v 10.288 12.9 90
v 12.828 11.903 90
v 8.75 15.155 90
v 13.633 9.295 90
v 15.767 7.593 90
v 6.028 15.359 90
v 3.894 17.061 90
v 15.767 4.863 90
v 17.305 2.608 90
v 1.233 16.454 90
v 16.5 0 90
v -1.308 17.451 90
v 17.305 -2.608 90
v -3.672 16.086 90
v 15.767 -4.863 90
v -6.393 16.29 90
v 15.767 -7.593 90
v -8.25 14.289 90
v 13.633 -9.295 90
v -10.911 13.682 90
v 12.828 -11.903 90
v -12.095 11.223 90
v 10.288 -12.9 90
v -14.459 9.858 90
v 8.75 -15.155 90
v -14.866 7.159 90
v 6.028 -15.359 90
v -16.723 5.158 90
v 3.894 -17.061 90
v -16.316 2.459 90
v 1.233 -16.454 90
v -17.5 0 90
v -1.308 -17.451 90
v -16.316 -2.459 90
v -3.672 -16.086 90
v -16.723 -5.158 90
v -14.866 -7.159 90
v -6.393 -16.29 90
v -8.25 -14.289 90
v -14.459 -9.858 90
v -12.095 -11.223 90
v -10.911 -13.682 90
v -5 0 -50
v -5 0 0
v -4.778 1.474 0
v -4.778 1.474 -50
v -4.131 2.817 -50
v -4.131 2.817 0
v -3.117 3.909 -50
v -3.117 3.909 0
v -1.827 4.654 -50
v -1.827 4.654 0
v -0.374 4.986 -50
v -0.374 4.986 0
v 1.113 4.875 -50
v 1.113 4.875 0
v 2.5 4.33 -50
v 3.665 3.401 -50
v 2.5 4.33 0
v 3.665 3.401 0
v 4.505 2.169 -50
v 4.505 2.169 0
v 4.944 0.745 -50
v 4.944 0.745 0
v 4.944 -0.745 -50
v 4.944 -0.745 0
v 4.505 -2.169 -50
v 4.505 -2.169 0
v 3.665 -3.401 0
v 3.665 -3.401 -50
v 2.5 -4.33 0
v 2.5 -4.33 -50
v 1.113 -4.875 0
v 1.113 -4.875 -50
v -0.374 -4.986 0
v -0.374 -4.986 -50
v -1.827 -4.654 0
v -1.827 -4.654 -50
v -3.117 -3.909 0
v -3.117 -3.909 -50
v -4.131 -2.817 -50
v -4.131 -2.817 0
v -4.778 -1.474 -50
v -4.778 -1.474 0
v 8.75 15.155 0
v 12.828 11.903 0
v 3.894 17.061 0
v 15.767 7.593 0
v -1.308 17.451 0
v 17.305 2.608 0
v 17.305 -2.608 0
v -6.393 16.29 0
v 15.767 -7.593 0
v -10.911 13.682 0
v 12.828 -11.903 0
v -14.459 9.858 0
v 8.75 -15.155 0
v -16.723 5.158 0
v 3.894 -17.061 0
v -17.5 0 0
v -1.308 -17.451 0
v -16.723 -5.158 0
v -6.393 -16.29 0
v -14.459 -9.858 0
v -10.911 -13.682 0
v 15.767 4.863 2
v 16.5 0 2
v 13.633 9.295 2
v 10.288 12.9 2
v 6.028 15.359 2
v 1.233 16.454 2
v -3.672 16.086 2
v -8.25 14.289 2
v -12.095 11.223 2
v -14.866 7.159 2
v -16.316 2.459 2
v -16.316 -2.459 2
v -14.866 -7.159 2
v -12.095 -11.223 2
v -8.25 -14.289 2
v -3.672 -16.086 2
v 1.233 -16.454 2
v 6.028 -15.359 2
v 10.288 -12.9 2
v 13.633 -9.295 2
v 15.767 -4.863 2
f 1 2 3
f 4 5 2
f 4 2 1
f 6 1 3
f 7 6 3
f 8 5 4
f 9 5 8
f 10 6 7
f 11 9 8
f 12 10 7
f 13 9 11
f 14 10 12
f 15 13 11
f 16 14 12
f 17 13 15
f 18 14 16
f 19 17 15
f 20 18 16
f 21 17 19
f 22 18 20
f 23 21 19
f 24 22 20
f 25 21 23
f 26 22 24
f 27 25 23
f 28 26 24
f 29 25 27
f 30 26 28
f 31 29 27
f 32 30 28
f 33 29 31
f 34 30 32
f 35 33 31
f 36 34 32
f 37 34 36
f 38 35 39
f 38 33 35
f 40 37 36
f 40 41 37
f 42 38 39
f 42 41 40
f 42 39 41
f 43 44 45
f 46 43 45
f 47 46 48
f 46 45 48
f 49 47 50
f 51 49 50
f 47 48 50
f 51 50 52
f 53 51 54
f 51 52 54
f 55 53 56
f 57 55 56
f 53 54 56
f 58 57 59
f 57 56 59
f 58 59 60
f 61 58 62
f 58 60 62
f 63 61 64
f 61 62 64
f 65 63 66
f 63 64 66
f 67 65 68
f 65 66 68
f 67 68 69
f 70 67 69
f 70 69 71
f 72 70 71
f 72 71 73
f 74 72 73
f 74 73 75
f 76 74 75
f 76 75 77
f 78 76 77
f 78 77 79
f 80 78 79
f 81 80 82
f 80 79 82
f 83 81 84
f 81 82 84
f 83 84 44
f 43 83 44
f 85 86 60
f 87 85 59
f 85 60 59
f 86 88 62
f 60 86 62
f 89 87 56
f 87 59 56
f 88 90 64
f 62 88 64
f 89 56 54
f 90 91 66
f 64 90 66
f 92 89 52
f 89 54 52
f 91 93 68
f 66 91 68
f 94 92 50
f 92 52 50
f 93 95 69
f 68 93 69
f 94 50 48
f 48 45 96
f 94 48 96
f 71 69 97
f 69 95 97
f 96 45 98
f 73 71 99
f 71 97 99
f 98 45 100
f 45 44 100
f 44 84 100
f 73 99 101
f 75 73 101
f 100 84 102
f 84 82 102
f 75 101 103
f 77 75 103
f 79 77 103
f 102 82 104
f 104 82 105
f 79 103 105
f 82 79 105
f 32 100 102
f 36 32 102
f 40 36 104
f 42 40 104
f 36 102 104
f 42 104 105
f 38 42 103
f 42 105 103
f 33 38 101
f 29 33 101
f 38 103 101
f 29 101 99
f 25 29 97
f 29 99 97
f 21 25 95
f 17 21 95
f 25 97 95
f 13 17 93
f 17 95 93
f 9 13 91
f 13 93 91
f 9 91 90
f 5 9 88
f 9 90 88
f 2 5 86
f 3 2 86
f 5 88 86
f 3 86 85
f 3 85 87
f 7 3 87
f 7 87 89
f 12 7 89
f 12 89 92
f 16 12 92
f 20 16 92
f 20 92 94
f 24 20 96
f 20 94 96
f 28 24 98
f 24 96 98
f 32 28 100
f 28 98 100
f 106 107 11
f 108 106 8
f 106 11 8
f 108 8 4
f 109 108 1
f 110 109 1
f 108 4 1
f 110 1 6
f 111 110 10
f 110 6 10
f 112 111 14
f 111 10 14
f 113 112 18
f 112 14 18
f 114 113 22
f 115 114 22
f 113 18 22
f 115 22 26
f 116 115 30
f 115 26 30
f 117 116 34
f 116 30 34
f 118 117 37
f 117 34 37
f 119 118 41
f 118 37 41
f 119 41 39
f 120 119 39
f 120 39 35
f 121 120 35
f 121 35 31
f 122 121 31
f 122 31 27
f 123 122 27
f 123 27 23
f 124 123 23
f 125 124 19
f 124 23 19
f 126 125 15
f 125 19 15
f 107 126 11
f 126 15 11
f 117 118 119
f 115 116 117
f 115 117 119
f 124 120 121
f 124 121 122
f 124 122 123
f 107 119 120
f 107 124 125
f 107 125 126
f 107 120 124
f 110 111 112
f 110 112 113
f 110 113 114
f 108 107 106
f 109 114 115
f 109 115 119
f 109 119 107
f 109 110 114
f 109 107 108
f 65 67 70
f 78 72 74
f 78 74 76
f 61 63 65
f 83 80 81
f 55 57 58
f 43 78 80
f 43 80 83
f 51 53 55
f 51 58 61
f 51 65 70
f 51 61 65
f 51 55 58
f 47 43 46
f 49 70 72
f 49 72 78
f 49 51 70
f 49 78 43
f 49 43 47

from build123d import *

# Parameters (mm, degrees)
SCHIZZO1_R                   = 17.5
ESTRUSIONE_ESTRUSIONE1_DEPTH = 90
SCHIZZO2_R                   = 16.5
TAGLIO_ESTRUSIONE1_DEPTH     = 88
SCHIZZO3_R                   = 5
ESTRUSIONE_ESTRUSIONE2_DEPTH = 50


with BuildPart() as part:
    # Schizzo1 → Estrusione-Estrusione1 (new body)
    with BuildSketch(Plane.XY):
        with Locations(Location((0, 0, 0), (0, 0, 180))):
            Circle(SCHIZZO1_R)
    extrude(amount=ESTRUSIONE_ESTRUSIONE1_DEPTH)

    # Schizzo2 → Taglio-Estrusione1 (cut)
    with BuildSketch(Plane.XY.offset(90)):
        Circle(SCHIZZO2_R)
    extrude(amount=-TAGLIO_ESTRUSIONE1_DEPTH, mode=Mode.SUBTRACT)

    # Schizzo3 → Estrusione-Estrusione2 (add)
    with BuildSketch(Plane(origin=(0, 0, 0), x_dir=(-1, 0, 0), z_dir=(0, 0, -1))):
        Circle(SCHIZZO3_R)
    extrude(amount=ESTRUSIONE_ESTRUSIONE2_DEPTH)


solid = part.part
